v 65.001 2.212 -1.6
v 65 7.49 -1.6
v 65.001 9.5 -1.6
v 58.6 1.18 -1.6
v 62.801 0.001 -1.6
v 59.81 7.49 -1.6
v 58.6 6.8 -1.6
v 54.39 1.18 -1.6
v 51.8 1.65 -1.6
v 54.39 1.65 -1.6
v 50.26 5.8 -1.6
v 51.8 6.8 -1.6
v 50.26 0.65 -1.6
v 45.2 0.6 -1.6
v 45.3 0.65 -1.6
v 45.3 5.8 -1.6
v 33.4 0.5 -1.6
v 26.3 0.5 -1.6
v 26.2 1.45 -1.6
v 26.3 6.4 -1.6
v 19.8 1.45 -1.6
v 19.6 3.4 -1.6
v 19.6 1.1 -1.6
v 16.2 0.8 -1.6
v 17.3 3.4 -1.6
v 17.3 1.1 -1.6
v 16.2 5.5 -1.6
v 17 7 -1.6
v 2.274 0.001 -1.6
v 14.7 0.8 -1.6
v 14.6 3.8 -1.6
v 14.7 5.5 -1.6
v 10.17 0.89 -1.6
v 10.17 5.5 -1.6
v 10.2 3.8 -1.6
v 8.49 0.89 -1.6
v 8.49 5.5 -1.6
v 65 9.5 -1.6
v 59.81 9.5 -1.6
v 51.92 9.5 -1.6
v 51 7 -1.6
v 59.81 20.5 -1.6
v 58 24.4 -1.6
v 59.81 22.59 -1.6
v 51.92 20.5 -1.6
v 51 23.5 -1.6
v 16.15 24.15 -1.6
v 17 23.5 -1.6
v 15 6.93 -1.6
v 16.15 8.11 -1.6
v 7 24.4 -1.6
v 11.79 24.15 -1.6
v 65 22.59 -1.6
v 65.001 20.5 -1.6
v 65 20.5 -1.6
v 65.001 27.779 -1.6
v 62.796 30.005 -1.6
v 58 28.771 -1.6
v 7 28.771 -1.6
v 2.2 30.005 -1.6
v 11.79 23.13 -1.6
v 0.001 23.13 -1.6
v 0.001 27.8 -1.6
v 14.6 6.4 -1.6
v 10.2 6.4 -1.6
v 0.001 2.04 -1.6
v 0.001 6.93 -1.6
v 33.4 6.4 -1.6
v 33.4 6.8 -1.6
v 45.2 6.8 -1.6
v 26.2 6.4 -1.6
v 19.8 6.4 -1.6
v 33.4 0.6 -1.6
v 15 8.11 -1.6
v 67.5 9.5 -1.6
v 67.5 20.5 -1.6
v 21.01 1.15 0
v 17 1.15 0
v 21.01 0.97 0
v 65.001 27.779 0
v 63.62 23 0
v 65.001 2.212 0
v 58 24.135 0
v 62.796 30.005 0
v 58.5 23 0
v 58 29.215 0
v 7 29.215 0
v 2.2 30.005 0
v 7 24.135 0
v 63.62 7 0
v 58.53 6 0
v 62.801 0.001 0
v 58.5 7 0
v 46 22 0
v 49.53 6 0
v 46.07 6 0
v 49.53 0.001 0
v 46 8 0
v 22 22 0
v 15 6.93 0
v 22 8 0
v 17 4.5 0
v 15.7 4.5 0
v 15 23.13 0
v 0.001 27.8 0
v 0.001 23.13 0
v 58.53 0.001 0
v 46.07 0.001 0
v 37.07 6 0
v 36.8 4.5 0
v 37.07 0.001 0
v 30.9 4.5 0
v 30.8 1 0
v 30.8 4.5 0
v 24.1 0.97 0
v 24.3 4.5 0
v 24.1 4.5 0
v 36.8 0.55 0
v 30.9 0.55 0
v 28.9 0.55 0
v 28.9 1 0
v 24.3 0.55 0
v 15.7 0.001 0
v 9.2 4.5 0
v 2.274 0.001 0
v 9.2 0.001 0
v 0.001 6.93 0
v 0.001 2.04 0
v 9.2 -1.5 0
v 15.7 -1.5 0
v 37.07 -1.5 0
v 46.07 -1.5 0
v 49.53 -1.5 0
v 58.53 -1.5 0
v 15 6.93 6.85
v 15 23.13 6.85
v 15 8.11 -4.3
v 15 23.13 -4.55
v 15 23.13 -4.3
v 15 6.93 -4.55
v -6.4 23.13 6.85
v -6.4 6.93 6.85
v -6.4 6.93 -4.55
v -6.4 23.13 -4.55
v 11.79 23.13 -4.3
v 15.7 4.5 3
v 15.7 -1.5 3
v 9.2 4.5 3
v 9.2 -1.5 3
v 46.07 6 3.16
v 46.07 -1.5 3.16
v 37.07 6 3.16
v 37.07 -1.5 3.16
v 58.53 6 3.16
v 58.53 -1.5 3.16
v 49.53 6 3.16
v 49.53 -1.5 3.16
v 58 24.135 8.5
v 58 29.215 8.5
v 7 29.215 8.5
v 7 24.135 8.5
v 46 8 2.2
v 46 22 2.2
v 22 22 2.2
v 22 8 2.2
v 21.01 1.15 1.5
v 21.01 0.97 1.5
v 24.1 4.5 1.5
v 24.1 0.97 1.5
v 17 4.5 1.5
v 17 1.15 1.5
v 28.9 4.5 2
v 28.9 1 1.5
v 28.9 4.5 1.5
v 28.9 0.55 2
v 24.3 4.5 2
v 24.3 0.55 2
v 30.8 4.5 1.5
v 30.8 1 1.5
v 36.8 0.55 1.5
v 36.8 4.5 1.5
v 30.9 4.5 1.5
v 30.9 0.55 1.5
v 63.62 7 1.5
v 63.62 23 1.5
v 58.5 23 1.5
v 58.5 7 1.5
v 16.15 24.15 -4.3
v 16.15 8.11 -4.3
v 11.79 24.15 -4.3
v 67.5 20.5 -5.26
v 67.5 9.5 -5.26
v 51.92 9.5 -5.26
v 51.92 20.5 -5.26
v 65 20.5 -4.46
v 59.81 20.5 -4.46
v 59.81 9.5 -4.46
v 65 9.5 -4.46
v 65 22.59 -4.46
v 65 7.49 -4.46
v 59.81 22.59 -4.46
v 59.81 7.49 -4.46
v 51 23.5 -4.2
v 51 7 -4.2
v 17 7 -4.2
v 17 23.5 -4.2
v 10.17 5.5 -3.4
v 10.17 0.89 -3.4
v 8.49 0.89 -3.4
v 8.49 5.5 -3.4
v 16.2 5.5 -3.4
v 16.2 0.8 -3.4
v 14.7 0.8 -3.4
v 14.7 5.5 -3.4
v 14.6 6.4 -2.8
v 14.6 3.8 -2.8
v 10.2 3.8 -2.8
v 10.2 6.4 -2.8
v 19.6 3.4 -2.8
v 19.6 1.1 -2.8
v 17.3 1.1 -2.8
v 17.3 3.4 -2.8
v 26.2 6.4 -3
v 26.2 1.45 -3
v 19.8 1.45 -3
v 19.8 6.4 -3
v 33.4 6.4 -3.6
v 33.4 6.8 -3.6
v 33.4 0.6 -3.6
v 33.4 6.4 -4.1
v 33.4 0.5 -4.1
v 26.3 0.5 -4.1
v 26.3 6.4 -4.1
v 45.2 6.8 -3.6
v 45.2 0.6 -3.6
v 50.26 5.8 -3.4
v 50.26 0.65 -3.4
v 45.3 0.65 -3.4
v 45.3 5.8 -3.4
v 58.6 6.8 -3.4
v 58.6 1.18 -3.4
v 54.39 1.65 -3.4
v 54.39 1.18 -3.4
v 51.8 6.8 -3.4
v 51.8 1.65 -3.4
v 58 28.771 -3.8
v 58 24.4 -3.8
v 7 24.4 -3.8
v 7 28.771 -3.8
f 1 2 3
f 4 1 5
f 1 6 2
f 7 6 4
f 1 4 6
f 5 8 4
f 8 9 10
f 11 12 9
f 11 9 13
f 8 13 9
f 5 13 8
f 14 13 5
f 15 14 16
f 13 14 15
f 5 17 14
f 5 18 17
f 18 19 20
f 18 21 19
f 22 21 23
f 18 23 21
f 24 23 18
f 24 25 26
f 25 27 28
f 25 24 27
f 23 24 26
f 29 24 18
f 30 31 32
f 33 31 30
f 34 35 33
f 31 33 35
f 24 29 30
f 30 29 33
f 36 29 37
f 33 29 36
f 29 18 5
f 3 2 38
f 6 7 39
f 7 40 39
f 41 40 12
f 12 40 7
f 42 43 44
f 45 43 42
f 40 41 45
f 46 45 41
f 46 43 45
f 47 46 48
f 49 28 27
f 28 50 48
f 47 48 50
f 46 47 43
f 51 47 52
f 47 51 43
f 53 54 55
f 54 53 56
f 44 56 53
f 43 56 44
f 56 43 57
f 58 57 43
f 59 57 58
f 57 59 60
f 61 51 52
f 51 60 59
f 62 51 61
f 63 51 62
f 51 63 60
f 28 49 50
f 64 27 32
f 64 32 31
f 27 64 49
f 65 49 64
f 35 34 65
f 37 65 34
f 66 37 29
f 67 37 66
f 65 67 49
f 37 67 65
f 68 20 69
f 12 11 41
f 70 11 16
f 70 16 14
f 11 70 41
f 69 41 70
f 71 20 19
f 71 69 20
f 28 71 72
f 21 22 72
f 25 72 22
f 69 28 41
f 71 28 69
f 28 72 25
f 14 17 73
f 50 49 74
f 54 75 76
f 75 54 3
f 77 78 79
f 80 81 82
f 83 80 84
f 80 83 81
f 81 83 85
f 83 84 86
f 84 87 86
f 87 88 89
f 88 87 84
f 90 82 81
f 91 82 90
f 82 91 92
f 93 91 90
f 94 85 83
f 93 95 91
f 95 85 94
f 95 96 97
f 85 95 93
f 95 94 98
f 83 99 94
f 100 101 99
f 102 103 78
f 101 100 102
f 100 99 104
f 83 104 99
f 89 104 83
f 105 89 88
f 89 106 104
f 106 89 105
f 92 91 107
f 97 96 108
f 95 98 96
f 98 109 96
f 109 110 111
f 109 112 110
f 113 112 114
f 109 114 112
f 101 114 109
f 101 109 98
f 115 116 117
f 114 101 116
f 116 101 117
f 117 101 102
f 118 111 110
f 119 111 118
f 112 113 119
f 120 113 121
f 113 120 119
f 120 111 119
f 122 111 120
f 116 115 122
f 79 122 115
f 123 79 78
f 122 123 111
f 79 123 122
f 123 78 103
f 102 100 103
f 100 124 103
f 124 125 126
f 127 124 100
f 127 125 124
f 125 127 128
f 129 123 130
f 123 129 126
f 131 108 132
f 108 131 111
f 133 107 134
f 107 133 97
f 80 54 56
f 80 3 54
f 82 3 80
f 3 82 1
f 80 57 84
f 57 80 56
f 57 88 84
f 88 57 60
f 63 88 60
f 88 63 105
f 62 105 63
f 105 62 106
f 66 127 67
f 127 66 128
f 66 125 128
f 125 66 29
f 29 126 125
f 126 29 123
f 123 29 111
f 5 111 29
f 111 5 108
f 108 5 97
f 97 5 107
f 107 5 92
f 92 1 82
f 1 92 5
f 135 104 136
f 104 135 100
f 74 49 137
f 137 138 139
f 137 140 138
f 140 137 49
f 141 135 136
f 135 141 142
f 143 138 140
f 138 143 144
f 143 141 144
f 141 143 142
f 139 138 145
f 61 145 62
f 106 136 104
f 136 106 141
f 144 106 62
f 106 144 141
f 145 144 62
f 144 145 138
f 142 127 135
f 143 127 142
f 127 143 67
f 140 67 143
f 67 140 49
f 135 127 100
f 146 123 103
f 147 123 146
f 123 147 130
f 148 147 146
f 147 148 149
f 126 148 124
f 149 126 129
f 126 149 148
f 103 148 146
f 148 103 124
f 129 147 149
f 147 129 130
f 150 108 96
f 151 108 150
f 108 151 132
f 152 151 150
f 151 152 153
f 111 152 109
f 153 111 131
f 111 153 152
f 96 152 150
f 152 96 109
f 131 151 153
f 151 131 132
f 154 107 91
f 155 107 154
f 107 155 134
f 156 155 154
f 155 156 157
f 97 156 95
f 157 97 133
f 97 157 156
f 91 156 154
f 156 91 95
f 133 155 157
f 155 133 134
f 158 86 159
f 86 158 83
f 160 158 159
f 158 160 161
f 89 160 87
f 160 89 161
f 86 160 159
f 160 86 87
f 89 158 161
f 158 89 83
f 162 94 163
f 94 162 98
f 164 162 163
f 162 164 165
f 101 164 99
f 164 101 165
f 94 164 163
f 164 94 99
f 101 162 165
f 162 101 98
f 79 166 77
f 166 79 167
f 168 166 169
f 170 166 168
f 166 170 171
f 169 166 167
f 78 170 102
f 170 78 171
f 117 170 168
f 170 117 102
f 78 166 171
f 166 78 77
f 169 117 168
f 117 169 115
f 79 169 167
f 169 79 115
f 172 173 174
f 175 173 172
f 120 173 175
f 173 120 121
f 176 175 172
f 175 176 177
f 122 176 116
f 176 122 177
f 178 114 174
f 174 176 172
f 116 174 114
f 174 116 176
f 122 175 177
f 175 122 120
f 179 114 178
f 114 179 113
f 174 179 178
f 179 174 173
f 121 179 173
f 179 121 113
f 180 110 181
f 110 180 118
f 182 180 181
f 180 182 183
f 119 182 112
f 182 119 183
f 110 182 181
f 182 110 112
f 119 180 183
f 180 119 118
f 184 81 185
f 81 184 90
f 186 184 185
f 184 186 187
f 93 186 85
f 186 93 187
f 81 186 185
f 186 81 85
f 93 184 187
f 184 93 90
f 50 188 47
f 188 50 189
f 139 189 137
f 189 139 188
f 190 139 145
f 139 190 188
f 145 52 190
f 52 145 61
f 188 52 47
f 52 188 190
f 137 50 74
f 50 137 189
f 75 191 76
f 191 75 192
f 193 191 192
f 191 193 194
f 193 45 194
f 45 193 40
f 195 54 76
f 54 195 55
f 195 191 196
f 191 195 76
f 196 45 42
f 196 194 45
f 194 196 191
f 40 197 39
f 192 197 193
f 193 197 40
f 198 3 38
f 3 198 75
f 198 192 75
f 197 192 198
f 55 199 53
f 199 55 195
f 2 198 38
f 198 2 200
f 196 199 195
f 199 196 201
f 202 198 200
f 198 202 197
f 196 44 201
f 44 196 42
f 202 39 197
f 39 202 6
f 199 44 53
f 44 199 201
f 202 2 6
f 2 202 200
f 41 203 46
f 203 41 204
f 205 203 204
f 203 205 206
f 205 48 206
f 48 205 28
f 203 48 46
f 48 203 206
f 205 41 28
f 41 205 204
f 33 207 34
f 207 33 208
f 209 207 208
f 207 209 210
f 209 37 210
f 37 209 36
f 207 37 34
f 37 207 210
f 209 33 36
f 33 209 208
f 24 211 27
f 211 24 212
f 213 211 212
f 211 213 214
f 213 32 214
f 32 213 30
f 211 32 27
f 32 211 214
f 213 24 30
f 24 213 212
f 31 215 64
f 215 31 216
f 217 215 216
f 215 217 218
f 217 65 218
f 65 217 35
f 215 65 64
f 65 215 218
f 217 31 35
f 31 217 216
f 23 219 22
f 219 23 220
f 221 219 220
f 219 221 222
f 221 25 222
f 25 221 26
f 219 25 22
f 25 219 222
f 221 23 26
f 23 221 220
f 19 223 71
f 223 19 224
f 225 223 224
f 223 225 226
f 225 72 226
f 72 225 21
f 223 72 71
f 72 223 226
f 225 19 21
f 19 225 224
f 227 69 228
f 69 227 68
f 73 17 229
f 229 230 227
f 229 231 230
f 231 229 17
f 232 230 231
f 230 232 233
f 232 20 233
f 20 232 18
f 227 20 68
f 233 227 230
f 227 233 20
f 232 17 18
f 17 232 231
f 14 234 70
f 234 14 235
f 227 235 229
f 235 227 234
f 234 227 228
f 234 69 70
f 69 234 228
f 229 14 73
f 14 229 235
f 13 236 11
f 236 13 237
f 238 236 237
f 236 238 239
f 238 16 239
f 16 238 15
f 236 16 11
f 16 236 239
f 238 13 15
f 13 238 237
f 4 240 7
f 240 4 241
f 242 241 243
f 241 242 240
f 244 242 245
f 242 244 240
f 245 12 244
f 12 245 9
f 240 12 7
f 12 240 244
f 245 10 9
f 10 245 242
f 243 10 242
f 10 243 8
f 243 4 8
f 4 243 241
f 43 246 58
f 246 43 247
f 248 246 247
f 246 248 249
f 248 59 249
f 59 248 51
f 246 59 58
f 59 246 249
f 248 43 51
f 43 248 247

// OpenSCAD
// Nominal manifold reference envelopes for Radxa ZERO 3E v1.2 + RA023 PoE HAT (14.5 mm pillars).
// Combines official RS109_RA023 3D STEP bounds with exact chamfered BG_OUTLINE PCB, real 40-pin
// GPIO centerline (CON1 y=[24.135,29.215], underside solder pads y<=28.771), and real underside &
// topside component footprints extracted from official radxa_zero_3e_v1200_bottom.dxf and
// radxa_zero_3e_v1200_top.dxf (omitted from Radxa's 3D STEP).
// Board-local frame: SBC PCB x=[0,65], y=[0,30], z=[-1.6,0]. Placed in housing by Z + 7.4 mm.
// Nominal design reference only — NOT measured owner hardware.
part = "sbc-ref";
hat_gap = 14.5;
$fn = 36;
mounts = [[3.549904,3.599942],[61.399928,3.599942],[3.599942,26.450036],[61.399928,26.500074]];

module box_xy(x0, x1, y0, y1, z0, z1) {
  translate([x0, y0, z0]) cube([x1 - x0, y1 - y0, z1 - z0]);
}

module sbc_ref() {
  union() {
    // Official chamfered 65 x 30 x 1.6 mm ZERO 3E v1.2 PCB (BG_OUTLINE ~2.2 mm corner chamfers)
    translate([0, 0, -1.6]) linear_extrude(1.6) polygon([
      [2.274, 0.001], [62.801, 0.001], [65.001, 2.212], [65.001, 27.779],
      [62.796, 30.005], [2.200, 30.005], [0.001, 27.800], [0.001, 22.470],
      [6.167, 22.025], [6.167, 8.025], [3.661, 7.571], [0.001, 7.571],
      [0.001, 2.040]
    ]);
    // Gigabit Ethernet RJ45 jack (official STEP outline y=6.93..23.13, z=-4.55..6.85)
    translate([-6.4, 6.93, -4.55]) cube([21.4, 16.20, 11.40]);
    // micro-HDMI receptacle (top-mount, covered by front wall, y=-1.5..4.5)
    translate([9.2, -1.5, 0]) cube([6.5, 6.0, 3.0]);
    // USB 3.0 Host Type-C receptacle (inner, center x=41.57)
    translate([41.57 - 4.5, -1.5, 0]) cube([9.0, 7.5, 3.16]);
    // USB 2.0 OTG / 5V Power Type-C receptacle (outer, center x=54.03)
    translate([54.03 - 4.5, -1.5, 0]) cube([9.0, 7.5, 3.16]);
    // Real 40-pin GPIO male header (CON1 centerline y=26.6751, shroud y=[24.1351,29.2151], z=0..8.5)
    box_xy(7.00, 58.00, 24.135, 29.215, 0.0, 8.50);
    // Main RK3566 SoC / PMIC / DRAM nominal envelope on top face
    translate([22.0, 8.0, 0]) cube([24.0, 14.0, 2.2]);

    // Real top-side front & closed-end SMD keepouts from radxa_zero_3e_v1200_top.dxf:
    box_xy(17.00, 21.01, 1.15, 4.50, 0.0, 1.50);  // SMD east of micro-HDMI
    box_xy(21.01, 24.10, 0.97, 4.50, 0.0, 1.50);  // U6 QFN & adjacent pads (y>=0.974)
    box_xy(24.30, 28.90, 0.55, 4.50, 0.0, 2.00);  // Two top power inductors
    box_xy(28.90, 30.80, 1.00, 4.50, 0.0, 1.50);  // Passives between inductor and WLCSP
    box_xy(30.90, 36.80, 0.55, 4.50, 0.0, 1.50);  // Top WLCSP/BGA + passives
    box_xy(58.50, 63.62, 7.00, 23.00, 0.0, 1.50); // C340..C348 & closed-end top SMD (x<=63.619)

    // Real underside STEP components:
    box_xy(11.79, 16.15, 8.11, 24.15, -4.30, -1.60); // Four underside power inductors L1..L4
    box_xy(51.92, 67.50, 9.50, 20.50, -5.26, -1.60); // Underside microSD cage + seated card
    box_xy(59.81, 65.00, 7.49, 22.59, -4.46, -1.60); // Underside CSI connector
    box_xy(17.00, 51.00, 7.00, 23.50, -4.20, -1.60); // Mid-board underside SMD keepout

    // Real underside front components & THT solder legs from radxa_zero_3e_v1200_bottom.dxf:
    box_xy(8.49, 10.17, 0.89, 5.50, -3.40, -1.60);   // micro-HDMI left THT shield legs
    box_xy(14.70, 16.20, 0.80, 5.50, -3.40, -1.60);  // micro-HDMI right THT shield legs
    box_xy(10.20, 14.60, 3.80, 6.40, -2.80, -1.60);  // ED9-12, R140, R141
    box_xy(17.30, 19.60, 1.10, 3.40, -2.80, -1.60);  // M3 pad / underside front passive
    box_xy(19.80, 26.20, 1.45, 6.40, -3.00, -1.60);  // C202, C208, C209, 6R8, C27, R2, R5, R104, R106
    box_xy(26.30, 33.40, 0.50, 6.40, -4.10, -1.60);  // U12 (16-pin SOIC, ~2 mm), Q4, R71, 6R7, 6C6, R110-112
    box_xy(33.40, 45.20, 0.60, 6.80, -3.60, -1.60);  // 6C2-5, 6R2-5, C78, R48, U11, R70
    box_xy(45.30, 50.26, 0.65, 5.80, -3.40, -1.60);  // USB3 & USB-OTG left THT shield legs + C151
    box_xy(51.80, 58.60, 1.65, 6.80, -3.40, -1.60);  // C338, D4, L9, D5, Q7, C339
    box_xy(54.39, 58.60, 1.18, 6.80, -3.40, -1.60);  // R108, R109 & USB-OTG right THT shield leg
    // Real 40-pin GPIO underside through-hole solder pads (PIN_SOLDERMASK_BOTTOM y<=28.7706)
    box_xy(7.00, 58.00, 24.40, 28.771, -3.80, -1.60);
  }
}

module hat_ref() {
  union() {
    // 65 x 30 x 1.6 mm RA023 PoE HAT PCB at official 14.5 mm pillar spacing
    translate([0, 0, hat_gap]) cube([65, 30, 1.6]);
    // Female GPIO stack header between SBC and HAT (aligned to CON1 y=24.135..29.215)
    box_xy(7.00, 58.00, 24.135, 29.215, 8.55, hat_gap);
    // Optional 20 x 20 x 6.5 mm underside cooling fan envelope between boards
    translate([22.0, 3.5, hat_gap - 6.5]) cube([20.0, 20.0, 6.5]);
    // PoE transformer / inductor / rectifier tallest top-side envelope (to z_rel = hat_gap + 13.7)
    translate([16.5, 3.0, hat_gap + 1.6]) cube([29.0, 22.0, 12.1]);
    // Four M2.5 x 14.5 mm insulated copper pillars + upper CM2.5x4 screw head envelopes
    for (m = mounts) {
      translate([m[0], m[1], 0.05]) cylinder(d=5.2, h=hat_gap - 0.05);
      translate([m[0], m[1], hat_gap + 1.6]) cylinder(d=5.2, h=1.8);
    }
  }
}

if (part == "sbc-ref") sbc_ref();
else if (part == "hat-ref") hat_ref();
else assert(false, "Unknown reference part");
